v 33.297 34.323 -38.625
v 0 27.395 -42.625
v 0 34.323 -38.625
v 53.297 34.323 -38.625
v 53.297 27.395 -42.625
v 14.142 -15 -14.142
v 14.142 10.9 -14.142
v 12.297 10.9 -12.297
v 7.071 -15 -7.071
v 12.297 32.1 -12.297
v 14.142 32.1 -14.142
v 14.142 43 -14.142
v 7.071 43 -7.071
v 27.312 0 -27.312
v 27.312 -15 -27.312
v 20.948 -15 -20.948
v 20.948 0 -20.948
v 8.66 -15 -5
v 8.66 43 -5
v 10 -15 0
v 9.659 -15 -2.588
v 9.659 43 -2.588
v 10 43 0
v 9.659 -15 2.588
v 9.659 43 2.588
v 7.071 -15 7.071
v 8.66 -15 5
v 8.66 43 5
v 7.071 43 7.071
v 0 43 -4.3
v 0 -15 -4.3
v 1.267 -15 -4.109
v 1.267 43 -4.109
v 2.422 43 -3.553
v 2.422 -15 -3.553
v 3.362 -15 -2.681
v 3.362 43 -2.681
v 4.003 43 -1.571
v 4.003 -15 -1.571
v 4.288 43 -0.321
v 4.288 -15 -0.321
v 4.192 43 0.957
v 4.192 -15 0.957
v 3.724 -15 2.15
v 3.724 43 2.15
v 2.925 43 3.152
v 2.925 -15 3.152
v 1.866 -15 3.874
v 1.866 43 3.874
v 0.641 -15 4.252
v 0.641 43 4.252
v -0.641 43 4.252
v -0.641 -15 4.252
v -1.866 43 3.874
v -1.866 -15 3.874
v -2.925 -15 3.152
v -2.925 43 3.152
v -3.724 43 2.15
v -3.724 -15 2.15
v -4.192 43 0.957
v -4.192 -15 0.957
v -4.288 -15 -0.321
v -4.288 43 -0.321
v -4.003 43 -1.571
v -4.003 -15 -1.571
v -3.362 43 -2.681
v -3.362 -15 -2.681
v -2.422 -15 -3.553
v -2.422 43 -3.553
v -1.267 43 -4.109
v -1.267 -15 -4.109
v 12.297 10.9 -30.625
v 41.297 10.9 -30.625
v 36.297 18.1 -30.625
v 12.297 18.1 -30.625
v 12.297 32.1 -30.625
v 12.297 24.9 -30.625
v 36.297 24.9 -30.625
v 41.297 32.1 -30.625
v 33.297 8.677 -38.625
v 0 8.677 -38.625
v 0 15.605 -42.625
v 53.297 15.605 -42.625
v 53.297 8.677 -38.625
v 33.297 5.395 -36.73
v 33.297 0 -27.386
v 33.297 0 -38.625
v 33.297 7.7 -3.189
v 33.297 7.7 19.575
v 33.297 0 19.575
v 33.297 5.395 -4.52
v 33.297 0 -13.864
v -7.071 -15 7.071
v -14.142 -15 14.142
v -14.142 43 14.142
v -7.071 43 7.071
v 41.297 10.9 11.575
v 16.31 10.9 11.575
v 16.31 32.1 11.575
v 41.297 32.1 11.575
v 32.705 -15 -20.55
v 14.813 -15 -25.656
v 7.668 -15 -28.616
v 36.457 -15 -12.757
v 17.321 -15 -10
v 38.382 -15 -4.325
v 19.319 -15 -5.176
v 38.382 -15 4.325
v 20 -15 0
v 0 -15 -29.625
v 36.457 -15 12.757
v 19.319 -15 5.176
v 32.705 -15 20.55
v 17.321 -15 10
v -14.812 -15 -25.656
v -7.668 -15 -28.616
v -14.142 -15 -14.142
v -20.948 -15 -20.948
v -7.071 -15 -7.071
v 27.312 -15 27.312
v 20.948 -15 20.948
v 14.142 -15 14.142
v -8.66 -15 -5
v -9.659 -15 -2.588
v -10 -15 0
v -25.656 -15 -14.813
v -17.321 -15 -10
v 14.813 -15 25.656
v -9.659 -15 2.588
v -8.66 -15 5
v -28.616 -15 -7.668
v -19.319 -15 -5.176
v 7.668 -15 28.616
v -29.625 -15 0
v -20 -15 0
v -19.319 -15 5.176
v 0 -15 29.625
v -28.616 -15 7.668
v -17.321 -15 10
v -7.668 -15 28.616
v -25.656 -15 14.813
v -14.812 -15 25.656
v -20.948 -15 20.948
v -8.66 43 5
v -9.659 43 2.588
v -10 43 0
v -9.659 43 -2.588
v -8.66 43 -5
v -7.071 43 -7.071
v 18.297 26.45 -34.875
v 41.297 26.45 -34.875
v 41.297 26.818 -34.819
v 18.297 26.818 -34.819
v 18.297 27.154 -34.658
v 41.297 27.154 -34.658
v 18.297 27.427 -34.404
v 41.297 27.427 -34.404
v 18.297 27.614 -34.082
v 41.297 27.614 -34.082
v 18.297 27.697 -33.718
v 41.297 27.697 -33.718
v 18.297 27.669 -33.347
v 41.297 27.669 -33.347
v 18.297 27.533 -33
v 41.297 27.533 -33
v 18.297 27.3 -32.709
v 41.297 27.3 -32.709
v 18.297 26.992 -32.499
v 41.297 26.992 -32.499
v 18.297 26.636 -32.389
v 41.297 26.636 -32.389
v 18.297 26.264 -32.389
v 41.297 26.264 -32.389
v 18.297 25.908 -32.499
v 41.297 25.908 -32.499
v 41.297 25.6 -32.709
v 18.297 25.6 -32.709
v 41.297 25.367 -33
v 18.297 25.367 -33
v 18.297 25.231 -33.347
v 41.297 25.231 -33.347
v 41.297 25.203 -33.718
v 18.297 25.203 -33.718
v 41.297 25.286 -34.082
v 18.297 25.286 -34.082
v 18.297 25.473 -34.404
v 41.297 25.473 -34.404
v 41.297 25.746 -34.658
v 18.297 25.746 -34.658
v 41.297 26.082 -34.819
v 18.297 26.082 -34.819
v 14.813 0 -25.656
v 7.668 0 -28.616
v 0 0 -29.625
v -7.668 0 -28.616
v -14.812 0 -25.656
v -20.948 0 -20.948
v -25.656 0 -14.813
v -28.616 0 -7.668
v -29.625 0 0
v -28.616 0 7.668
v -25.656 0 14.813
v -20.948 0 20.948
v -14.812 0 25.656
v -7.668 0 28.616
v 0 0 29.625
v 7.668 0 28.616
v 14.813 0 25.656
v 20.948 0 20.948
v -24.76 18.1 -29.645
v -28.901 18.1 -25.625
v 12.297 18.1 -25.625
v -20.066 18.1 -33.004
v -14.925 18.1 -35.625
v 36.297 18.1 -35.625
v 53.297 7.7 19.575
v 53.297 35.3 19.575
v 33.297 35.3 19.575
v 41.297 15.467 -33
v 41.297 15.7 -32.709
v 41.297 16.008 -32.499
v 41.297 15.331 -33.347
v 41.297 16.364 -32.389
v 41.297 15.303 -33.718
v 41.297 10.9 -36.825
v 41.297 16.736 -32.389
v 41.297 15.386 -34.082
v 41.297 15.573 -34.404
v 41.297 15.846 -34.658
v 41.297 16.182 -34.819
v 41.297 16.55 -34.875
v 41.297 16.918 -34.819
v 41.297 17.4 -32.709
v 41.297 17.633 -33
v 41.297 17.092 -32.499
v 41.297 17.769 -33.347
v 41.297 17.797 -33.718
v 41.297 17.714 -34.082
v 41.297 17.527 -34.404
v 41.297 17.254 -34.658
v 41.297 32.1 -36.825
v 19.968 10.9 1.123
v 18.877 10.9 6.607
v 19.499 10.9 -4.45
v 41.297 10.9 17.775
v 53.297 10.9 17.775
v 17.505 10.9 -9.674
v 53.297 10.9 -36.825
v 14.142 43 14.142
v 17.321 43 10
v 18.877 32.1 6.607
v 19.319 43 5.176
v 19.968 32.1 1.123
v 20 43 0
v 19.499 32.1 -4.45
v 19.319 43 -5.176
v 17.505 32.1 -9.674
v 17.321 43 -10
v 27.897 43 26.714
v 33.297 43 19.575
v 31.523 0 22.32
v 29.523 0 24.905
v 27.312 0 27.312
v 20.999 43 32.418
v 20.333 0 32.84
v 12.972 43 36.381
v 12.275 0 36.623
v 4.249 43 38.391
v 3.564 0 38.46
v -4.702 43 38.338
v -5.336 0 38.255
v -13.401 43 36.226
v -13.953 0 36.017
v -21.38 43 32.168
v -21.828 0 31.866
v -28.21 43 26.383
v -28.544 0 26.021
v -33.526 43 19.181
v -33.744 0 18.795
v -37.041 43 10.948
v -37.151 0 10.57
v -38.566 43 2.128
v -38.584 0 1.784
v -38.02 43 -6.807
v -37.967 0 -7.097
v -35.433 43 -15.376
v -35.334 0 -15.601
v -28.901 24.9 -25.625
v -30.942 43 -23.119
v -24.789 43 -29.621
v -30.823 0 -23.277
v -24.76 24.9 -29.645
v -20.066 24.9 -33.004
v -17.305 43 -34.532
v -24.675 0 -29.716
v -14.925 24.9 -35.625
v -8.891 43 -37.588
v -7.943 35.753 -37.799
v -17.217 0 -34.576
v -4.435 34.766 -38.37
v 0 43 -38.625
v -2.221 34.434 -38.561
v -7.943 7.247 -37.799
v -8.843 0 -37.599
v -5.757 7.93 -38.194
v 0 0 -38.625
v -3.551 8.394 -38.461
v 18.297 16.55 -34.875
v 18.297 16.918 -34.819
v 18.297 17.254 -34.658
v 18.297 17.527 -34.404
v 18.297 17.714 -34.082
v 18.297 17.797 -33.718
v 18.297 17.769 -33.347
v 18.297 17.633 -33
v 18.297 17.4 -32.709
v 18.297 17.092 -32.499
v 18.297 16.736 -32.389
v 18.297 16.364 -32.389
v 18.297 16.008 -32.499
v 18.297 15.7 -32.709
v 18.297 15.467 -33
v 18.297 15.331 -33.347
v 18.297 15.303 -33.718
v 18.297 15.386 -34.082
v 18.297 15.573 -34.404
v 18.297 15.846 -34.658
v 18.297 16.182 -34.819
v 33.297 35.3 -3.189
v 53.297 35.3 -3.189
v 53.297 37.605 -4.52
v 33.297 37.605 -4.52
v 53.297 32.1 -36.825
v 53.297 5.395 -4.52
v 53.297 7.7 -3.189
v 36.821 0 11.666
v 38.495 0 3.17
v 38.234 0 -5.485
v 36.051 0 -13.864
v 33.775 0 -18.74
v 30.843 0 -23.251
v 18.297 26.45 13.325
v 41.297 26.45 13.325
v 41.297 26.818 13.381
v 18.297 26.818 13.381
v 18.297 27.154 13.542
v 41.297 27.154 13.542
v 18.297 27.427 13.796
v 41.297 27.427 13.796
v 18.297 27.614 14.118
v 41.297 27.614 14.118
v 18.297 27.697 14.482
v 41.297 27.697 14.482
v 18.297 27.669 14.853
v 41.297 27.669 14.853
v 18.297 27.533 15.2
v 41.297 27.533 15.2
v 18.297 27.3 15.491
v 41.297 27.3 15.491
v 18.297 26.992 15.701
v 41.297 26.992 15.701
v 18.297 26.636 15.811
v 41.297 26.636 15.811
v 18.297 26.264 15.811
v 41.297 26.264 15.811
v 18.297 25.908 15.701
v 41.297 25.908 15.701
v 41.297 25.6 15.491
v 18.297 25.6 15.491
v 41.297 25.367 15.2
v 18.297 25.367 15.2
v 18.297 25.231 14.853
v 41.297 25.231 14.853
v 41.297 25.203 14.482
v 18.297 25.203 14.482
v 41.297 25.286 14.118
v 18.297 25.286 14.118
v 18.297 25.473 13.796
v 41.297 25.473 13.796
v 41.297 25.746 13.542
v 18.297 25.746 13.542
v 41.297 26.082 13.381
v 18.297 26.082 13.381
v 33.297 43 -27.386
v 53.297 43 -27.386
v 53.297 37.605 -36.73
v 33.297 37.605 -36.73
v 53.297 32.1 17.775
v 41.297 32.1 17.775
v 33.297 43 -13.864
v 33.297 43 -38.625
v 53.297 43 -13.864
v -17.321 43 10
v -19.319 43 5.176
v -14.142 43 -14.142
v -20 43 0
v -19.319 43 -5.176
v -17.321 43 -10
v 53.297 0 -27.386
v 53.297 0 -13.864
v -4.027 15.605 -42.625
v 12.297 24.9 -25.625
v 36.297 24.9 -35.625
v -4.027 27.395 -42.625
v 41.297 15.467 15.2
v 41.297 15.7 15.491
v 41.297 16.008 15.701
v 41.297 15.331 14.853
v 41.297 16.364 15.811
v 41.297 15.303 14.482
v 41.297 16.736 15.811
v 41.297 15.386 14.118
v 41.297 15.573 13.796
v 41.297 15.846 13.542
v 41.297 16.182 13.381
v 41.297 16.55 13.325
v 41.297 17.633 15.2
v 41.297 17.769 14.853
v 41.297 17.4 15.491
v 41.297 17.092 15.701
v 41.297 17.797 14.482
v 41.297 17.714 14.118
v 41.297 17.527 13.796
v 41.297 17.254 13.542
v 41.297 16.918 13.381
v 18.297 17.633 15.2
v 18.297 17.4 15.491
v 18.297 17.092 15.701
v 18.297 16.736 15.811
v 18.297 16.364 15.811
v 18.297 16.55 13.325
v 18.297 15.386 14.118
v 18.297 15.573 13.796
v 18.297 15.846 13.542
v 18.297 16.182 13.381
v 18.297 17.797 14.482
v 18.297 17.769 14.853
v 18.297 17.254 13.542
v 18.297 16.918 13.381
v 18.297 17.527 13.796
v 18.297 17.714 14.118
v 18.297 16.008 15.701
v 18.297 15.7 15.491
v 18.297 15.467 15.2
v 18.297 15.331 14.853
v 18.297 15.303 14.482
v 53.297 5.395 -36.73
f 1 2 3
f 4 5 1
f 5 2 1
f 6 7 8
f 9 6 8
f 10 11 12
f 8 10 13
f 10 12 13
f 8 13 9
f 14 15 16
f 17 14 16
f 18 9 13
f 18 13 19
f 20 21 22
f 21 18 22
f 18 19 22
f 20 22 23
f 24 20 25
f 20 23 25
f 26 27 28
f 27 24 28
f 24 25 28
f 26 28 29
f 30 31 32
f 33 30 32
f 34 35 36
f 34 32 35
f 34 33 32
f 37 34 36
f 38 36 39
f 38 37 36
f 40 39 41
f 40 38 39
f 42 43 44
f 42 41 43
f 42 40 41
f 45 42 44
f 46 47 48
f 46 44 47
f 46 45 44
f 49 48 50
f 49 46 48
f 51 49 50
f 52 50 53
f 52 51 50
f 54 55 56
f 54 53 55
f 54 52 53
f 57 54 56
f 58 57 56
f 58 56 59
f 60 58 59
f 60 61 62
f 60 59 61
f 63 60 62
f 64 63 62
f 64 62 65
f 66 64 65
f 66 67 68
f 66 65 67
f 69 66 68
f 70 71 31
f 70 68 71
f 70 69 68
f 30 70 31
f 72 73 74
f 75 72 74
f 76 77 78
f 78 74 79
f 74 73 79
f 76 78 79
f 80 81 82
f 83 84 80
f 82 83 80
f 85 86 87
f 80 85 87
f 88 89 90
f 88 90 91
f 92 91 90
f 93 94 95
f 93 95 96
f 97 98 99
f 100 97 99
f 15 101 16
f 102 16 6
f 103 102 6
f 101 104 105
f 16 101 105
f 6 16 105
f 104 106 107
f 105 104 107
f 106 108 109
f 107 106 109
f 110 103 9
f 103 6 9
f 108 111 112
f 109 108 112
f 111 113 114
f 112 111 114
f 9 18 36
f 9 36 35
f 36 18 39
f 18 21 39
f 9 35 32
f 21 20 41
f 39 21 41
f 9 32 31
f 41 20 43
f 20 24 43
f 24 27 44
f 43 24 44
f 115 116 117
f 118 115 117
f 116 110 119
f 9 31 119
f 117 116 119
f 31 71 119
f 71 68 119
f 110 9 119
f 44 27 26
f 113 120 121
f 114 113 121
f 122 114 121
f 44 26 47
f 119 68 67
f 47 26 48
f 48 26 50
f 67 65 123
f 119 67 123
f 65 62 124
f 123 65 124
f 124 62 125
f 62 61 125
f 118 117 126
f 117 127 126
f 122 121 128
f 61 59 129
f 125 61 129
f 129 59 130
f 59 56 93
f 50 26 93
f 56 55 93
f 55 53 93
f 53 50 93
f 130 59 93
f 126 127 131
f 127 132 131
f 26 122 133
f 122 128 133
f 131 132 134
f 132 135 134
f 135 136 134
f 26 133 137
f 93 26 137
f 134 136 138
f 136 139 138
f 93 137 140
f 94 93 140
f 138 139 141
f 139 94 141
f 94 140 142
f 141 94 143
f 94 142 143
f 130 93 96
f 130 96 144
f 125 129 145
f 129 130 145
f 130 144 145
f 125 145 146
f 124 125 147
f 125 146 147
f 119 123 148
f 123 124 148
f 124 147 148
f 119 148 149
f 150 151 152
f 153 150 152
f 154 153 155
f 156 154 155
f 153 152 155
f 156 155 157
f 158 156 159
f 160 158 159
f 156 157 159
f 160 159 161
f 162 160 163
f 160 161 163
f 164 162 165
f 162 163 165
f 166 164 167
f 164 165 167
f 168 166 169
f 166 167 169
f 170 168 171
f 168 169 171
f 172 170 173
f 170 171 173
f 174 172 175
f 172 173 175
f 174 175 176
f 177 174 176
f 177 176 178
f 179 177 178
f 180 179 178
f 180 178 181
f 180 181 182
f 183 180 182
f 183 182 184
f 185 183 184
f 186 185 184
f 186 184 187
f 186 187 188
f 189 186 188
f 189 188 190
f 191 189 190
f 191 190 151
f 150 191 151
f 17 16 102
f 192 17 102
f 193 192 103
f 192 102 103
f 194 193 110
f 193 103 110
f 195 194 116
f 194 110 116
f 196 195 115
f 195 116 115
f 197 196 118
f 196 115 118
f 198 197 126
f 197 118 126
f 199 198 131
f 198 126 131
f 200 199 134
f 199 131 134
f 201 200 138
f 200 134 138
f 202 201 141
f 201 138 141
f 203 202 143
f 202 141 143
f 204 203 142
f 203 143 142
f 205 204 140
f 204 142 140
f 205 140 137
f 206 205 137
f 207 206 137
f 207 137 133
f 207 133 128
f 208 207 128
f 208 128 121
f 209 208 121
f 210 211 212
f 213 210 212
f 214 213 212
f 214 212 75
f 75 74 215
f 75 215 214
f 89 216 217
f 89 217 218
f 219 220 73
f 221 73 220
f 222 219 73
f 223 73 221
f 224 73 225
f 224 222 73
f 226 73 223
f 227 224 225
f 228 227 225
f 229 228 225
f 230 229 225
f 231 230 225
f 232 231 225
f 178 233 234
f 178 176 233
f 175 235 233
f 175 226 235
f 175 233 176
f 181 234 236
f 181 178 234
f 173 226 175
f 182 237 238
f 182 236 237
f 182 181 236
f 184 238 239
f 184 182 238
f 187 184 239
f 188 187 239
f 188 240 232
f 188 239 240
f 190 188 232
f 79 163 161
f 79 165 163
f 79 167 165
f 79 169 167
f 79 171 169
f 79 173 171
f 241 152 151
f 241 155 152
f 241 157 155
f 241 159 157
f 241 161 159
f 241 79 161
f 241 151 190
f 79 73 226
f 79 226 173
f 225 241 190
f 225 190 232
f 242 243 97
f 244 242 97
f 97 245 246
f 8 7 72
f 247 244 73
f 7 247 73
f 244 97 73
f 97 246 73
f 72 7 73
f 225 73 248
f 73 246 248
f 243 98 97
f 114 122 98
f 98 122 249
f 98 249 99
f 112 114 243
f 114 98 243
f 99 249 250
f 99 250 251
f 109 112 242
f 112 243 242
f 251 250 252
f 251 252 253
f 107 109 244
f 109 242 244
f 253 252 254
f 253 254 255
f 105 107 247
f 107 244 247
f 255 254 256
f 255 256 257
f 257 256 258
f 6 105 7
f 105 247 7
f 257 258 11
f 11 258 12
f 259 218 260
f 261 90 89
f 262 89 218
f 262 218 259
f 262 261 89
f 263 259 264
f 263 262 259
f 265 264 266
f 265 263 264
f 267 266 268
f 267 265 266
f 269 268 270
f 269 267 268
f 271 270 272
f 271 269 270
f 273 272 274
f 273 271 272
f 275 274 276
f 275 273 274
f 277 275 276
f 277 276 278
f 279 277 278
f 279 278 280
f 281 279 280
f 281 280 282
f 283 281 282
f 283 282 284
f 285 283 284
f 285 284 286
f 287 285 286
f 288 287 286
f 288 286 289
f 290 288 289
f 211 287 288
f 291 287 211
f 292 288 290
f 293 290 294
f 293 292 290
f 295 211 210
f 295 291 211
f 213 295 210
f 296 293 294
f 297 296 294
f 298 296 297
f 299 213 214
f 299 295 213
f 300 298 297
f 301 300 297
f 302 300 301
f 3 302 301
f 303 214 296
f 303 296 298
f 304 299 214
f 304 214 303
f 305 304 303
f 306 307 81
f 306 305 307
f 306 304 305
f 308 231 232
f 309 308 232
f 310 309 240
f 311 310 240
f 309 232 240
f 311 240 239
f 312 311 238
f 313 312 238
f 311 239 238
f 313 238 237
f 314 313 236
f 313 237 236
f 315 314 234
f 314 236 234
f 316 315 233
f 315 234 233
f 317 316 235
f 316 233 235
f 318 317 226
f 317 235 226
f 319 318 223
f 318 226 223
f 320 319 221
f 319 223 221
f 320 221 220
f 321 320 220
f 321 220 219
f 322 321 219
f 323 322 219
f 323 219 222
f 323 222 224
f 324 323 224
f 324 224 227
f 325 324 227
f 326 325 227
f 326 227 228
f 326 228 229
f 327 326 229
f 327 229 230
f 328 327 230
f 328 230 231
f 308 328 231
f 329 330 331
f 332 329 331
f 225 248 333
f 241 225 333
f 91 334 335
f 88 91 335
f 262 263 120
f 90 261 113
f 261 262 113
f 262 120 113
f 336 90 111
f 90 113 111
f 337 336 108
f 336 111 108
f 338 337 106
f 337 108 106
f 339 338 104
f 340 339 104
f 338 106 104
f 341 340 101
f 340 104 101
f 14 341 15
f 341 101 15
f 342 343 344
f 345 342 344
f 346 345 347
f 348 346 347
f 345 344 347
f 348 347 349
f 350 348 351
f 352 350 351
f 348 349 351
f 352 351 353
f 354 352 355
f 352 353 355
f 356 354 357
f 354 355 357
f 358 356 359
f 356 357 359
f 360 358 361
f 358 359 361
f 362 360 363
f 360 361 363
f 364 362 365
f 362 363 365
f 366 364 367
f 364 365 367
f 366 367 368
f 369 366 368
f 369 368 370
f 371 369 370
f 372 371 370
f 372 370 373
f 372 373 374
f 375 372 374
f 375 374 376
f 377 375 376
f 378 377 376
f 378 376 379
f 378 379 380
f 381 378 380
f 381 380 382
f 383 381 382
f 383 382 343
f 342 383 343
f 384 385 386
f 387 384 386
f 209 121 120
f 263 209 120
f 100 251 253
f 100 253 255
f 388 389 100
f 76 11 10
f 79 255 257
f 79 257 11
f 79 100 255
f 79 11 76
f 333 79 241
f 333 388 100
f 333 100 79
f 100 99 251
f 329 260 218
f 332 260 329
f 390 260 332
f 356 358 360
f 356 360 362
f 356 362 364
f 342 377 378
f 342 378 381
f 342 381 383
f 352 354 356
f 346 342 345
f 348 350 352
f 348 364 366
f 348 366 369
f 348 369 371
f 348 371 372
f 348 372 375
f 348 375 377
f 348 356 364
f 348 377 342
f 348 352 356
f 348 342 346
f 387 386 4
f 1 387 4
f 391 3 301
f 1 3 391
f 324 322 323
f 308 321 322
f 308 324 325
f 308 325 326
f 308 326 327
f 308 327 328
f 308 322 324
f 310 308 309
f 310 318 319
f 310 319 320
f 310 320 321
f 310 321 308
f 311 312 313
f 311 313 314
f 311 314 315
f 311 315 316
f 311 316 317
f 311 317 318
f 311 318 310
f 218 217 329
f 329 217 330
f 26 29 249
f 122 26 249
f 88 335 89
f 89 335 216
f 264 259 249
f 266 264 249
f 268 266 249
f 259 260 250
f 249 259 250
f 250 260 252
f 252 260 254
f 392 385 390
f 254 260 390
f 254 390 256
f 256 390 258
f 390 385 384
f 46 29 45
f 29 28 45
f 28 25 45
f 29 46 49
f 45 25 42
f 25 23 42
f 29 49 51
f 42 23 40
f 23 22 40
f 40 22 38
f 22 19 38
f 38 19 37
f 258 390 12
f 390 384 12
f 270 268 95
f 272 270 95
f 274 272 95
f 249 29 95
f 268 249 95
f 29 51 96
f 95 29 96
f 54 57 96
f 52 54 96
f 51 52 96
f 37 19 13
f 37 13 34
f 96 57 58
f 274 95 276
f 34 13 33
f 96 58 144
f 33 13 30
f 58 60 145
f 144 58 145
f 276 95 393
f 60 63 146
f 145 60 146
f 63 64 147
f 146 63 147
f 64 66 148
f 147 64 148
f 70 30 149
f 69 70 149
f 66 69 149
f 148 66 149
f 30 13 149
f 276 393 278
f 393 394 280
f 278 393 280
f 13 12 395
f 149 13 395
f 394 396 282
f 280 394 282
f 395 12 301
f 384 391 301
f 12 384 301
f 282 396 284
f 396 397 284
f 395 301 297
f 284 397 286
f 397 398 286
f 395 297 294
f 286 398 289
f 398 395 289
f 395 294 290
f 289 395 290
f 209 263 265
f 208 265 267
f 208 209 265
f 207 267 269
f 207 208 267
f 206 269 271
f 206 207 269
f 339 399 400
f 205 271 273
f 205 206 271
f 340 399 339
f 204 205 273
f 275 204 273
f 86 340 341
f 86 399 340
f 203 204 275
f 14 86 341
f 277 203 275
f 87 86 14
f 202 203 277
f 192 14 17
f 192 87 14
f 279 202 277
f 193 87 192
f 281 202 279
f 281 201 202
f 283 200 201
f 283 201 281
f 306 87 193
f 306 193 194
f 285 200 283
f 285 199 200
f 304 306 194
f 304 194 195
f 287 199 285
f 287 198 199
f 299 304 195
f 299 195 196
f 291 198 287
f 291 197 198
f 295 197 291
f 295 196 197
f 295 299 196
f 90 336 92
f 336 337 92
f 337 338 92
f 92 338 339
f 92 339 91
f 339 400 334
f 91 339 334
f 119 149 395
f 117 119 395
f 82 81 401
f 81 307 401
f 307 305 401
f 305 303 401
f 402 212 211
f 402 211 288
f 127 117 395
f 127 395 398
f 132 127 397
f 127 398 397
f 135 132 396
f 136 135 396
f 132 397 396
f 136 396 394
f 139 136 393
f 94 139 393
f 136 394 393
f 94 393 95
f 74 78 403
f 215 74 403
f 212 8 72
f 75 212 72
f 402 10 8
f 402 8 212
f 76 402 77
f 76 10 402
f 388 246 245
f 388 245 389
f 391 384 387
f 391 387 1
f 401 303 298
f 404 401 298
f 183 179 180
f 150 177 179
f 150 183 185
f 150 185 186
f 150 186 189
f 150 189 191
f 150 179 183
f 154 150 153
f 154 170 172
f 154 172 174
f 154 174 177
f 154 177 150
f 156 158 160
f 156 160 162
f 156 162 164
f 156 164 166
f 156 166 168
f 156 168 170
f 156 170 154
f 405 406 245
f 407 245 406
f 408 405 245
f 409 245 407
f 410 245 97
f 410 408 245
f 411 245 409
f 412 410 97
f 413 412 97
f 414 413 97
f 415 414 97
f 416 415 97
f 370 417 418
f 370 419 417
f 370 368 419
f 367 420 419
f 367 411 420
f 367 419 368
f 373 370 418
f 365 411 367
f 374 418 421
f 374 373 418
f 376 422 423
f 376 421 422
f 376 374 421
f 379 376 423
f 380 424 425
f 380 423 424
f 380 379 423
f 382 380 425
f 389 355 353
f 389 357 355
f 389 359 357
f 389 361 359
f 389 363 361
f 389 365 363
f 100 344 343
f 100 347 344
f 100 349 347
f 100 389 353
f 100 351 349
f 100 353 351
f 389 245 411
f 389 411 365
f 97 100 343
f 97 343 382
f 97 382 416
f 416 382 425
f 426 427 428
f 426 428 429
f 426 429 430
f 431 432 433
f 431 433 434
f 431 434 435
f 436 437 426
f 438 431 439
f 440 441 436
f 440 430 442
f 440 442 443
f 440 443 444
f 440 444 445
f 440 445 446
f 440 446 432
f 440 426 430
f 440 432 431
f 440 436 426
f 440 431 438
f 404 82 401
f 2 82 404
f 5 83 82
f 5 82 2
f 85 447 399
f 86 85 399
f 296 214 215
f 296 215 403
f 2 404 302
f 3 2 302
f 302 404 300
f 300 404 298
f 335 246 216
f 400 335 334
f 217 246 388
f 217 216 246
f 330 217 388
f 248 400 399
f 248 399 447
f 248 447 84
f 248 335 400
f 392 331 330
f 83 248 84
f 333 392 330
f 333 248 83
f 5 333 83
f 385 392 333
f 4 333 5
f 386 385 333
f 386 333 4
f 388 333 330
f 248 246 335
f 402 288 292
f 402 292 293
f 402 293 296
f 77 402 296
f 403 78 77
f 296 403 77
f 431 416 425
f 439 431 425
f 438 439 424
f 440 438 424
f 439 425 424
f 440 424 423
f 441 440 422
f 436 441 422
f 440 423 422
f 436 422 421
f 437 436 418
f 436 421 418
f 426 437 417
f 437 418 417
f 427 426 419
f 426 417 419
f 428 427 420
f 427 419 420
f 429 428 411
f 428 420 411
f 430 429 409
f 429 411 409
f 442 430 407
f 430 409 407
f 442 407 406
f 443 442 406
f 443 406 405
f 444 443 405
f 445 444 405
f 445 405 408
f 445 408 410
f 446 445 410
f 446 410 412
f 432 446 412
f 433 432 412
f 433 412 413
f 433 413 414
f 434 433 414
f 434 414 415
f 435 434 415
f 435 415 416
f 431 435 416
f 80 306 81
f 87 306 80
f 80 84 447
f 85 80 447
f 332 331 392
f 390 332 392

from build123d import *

# Parameters (mm, degrees)
BOSS_EXTRUDE1_DEPTH     = 43
BOSS_EXTRUDE2_START     = 15
BOSS_EXTRUDE2_DEPTH     = 15
SKETCH5_W               = 42.2
SKETCH5_H               = 21.2
CUT_EXTRUDE1_DEPTH      = 41
SKETCH5_5_W             = 6.2
SKETCH5_5_H             = 21.2
SKETCH5_5_R             = 1.25
CUT_EXTRUDE2_DEPTH      = 12
SKETCH5_6_R             = 1.25
CUT_EXTRUDE3_DEPTH      = 35
CUT_EXTRUDE4_DEPTH      = 88.729655833
CUT_EXTRUDE4_DEPTH_BACK = 88.729655833
SKETCH6_R               = 4.3
CUT_EXTRUDE5_START      = -5
SKETCH7_W               = 10
SKETCH7_H               = 6.8
CUT_EXTRUDE5_DEPTH      = 94.632977309
CUT_EXTRUDE9_DEPTH      = 20
BOSS_EXTRUDE3_DEPTH     = 53.297297


with BuildPart() as part:
    # Sketch1 → Boss-Extrude1 (new body)
    with BuildSketch(Plane(origin=(0, 0, 0), x_dir=(1, 0, 0), z_dir=(0, 1, 0))):
        with BuildLine():
            Line((0, 38.625), (53.297297188, 38.625))
            Line((53.297297188, 38.625), (53.297297188, -19.575))
            Line((53.297297188, -19.575), (33.297297188, -19.575))
            ThreePointArc((33.297297188, -19.575), (-33.525922806, -19.180800948), (0, 38.625))
        make_face()
    extrude(amount=BOSS_EXTRUDE1_DEPTH)

    # Sketch4 → Boss-Extrude2 (add)
    with BuildSketch(Plane.XZ.offset(BOSS_EXTRUDE2_START)):
        with BuildLine():
            Line((20.948038393, 20.948038393), (27.311999423, 27.311999423))
            ThreePointArc((27.311999423, 27.311999423), (38.625, 0), (27.311999423, -27.311999423))
            Line((27.311999423, -27.311999423), (20.948038393, -20.948038393))
            ThreePointArc((20.948038393, -20.948038393), (-29.625, 0), (20.948038393, 20.948038393))
        make_face()
    extrude(amount=-BOSS_EXTRUDE2_DEPTH)

    # Sketch5 → Cut-Extrude1 (cut)
    with BuildSketch(Plane(origin=(53.297297188, 0, 0), x_dir=(0, 0, -1), z_dir=(1, 0, 0))):
        with Locations((9.525, 21.5)):
            Rectangle(SKETCH5_W, SKETCH5_H)
    extrude(amount=-CUT_EXTRUDE1_DEPTH, mode=Mode.SUBTRACT)

    # Sketch5<5> → Cut-Extrude2 (cut)
    # profile 1 of 2: a face of its own
    with BuildSketch(Plane(origin=(53.297297188, 0, 0), x_dir=(0, 0, -1), z_dir=(1, 0, 0))):
        with Locations((-14.675, 21.5)):
            Rectangle(SKETCH5_5_W, SKETCH5_5_H)
        with Locations((-14.575, 16.55)):
            Circle(SKETCH5_5_R, mode=Mode.SUBTRACT)
        with Locations((-14.575, 26.45)):
            Circle(SKETCH5_5_R, mode=Mode.SUBTRACT)
    # profile 2 of 2: a face of its own
    with BuildSketch(Plane(origin=(53.297297188, 0, 0), x_dir=(0, 0, -1), z_dir=(1, 0, 0))):
        with Locations((33.725, 21.5)):
            Rectangle(SKETCH5_5_W, SKETCH5_5_H)
        with Locations((33.625, 26.45)):
            Circle(SKETCH5_5_R, mode=Mode.SUBTRACT)
        with Locations((33.625, 16.55)):
            Circle(SKETCH5_5_R, mode=Mode.SUBTRACT)
    extrude(amount=-CUT_EXTRUDE2_DEPTH, mode=Mode.SUBTRACT)

    # Sketch5<6> → Cut-Extrude3 (cut)
    with BuildSketch(Plane(origin=(53.297297188, 0, 0), x_dir=(0, 0, -1), z_dir=(1, 0, 0))):
        with Locations((33.625, 26.45)):
            Circle(SKETCH5_6_R)
        with Locations((33.625, 16.55)):
            Circle(SKETCH5_6_R)
        with Locations((-14.575, 26.45)):
            Circle(SKETCH5_6_R)
        with Locations((-14.575, 16.55)):
            Circle(SKETCH5_6_R)
    extrude(amount=-CUT_EXTRUDE3_DEPTH, mode=Mode.SUBTRACT)

    # Sketch6 → Cut-Extrude4 (cut, two sides: drawn at the far end of the back side and taken through both)
    with BuildSketch(Plane.XZ.offset(15).offset(-CUT_EXTRUDE4_DEPTH_BACK)):
        with Locations(Location((0, 0, 0), (0, 0, 270))):
            Circle(SKETCH6_R)
        with BuildLine():
            Line((7.071067812, 7.071067812), (14.142135624, 14.142135624))
            ThreePointArc((14.142135624, 14.142135624), (20, 0), (14.142135624, -14.142135624))
            Line((14.142135624, -14.142135624), (7.071067812, -7.071067812))
            ThreePointArc((7.071067812, -7.071067812), (10, 0), (7.071067812, 7.071067812))
        make_face()
        with BuildLine():
            Line((-7.071067812, -7.071067812), (-14.142135624, -14.142135624))
            ThreePointArc((-14.142135624, -14.142135624), (-20, 0), (-14.142135624, 14.142135624))
            Line((-14.142135624, 14.142135624), (-7.071067812, 7.071067812))
            ThreePointArc((-7.071067812, 7.071067812), (-10, 0), (-7.071067812, -7.071067812))
        make_face()
    extrude(amount=CUT_EXTRUDE4_DEPTH + CUT_EXTRUDE4_DEPTH_BACK, mode=Mode.SUBTRACT)

    # Sketch7 → Cut-Extrude5 (cut, through all)
    with BuildSketch(Plane(origin=(41.297297188, 0, 0), x_dir=(0, 0, -1), z_dir=(1, 0, 0)).offset(CUT_EXTRUDE5_START)):
        with Locations((30.625, 21.5)):
            Rectangle(SKETCH7_W, SKETCH7_H)
    extrude(amount=-CUT_EXTRUDE5_DEPTH, mode=Mode.SUBTRACT)

    # Sketch9 → Cut-Extrude9 (cut)
    with BuildSketch(Plane(origin=(53.297297188, 0, 0), x_dir=(0, 0, -1), z_dir=(1, 0, 0))):
        Polygon((38.625, 43), (27.385907637, 43), (36.730117767, 37.605117767), (38.625, 34.323085464), align=None)
        Polygon((4.519882233, 37.605117767), (13.864092363, 43), (-19.575, 43), (-19.575, 35.3), (3.18902187, 35.3), align=None)
        Polygon((3.18902187, 7.7), (-19.575, 7.7), (-19.575, 0), (13.864092363, 0), (4.519882233, 5.394882233), align=None)
        Polygon((38.625, 0), (38.625, 8.676914536), (36.730117767, 5.394882233), (27.385907637, 0), align=None)
    extrude(amount=-CUT_EXTRUDE9_DEPTH, mode=Mode.SUBTRACT)

    # Sketch9<7> → Boss-Extrude3 (add)
    with BuildSketch(Plane(origin=(53.297297188, 0, 0), x_dir=(0, 0, -1), z_dir=(1, 0, 0))):
        Polygon((42.625, 27.394882233), (38.625, 34.323085464), (38.625, 8.676914536), (42.625, 15.605117767), align=None)
    extrude(amount=-BOSS_EXTRUDE3_DEPTH)

    # Chamfer1
    # the kernel refuses this chamfer: 10 mm, written as the material it adds along each edge
    with BuildSketch(Plane(origin=(1.88e-07, 57.509605692, -38.625), x_dir=(-0.9905263247652732, 0, 0.13732297676281435), z_dir=(0, -1, 0))) as chamfer1_piece_1_section:
        with BuildLine():
            Line((8.273915537, 0), (-1.522844477, 9.14873215))
            Line((-1.522844477, 9.14873215), (-1.720949742, 9.121267554))
            ThreePointArc((-1.720949742, 9.121267554), (-0.834678391, 4.564210108), (-0.198105265, -0.027464595))
            Line((-0.198105265, -0.027464595), (0.027464596, -0.198105265))
            ThreePointArc((0.027464596, -0.198105265), (4.132441209, 0.148053406), (8.26005162, -0.199518901))
            Line((8.26005162, -0.199518901), (8.273915537, 0))
        make_face()
    chamfer1_piece_1 = extrude(amount=72.019211383, mode=Mode.PRIVATE)
    chamfer1_piece_1 = split(chamfer1_piece_1, bisect_by=Plane(origin=(-3.347907706, 24.181861257, -44.480038526), z_dir=(0, -0.5000000000000007, 0.8660254037844383)), keep=Keep.TOP, mode=Mode.PRIVATE)
    chamfer1_piece_1 = split(chamfer1_piece_1, bisect_by=Plane(origin=(-3.347907706, 21.5, -42.625), z_dir=(0, 0, 1)), keep=Keep.TOP, mode=Mode.PRIVATE)
    chamfer1_piece_1 = split(chamfer1_piece_1, bisect_by=Plane(origin=(-3.347907706, 18.818138743, -44.480038526), z_dir=(0, 0.5000000000000001, 0.8660254037844386)), keep=Keep.TOP, mode=Mode.PRIVATE)
    add(chamfer1_piece_1)


solid = part.part
